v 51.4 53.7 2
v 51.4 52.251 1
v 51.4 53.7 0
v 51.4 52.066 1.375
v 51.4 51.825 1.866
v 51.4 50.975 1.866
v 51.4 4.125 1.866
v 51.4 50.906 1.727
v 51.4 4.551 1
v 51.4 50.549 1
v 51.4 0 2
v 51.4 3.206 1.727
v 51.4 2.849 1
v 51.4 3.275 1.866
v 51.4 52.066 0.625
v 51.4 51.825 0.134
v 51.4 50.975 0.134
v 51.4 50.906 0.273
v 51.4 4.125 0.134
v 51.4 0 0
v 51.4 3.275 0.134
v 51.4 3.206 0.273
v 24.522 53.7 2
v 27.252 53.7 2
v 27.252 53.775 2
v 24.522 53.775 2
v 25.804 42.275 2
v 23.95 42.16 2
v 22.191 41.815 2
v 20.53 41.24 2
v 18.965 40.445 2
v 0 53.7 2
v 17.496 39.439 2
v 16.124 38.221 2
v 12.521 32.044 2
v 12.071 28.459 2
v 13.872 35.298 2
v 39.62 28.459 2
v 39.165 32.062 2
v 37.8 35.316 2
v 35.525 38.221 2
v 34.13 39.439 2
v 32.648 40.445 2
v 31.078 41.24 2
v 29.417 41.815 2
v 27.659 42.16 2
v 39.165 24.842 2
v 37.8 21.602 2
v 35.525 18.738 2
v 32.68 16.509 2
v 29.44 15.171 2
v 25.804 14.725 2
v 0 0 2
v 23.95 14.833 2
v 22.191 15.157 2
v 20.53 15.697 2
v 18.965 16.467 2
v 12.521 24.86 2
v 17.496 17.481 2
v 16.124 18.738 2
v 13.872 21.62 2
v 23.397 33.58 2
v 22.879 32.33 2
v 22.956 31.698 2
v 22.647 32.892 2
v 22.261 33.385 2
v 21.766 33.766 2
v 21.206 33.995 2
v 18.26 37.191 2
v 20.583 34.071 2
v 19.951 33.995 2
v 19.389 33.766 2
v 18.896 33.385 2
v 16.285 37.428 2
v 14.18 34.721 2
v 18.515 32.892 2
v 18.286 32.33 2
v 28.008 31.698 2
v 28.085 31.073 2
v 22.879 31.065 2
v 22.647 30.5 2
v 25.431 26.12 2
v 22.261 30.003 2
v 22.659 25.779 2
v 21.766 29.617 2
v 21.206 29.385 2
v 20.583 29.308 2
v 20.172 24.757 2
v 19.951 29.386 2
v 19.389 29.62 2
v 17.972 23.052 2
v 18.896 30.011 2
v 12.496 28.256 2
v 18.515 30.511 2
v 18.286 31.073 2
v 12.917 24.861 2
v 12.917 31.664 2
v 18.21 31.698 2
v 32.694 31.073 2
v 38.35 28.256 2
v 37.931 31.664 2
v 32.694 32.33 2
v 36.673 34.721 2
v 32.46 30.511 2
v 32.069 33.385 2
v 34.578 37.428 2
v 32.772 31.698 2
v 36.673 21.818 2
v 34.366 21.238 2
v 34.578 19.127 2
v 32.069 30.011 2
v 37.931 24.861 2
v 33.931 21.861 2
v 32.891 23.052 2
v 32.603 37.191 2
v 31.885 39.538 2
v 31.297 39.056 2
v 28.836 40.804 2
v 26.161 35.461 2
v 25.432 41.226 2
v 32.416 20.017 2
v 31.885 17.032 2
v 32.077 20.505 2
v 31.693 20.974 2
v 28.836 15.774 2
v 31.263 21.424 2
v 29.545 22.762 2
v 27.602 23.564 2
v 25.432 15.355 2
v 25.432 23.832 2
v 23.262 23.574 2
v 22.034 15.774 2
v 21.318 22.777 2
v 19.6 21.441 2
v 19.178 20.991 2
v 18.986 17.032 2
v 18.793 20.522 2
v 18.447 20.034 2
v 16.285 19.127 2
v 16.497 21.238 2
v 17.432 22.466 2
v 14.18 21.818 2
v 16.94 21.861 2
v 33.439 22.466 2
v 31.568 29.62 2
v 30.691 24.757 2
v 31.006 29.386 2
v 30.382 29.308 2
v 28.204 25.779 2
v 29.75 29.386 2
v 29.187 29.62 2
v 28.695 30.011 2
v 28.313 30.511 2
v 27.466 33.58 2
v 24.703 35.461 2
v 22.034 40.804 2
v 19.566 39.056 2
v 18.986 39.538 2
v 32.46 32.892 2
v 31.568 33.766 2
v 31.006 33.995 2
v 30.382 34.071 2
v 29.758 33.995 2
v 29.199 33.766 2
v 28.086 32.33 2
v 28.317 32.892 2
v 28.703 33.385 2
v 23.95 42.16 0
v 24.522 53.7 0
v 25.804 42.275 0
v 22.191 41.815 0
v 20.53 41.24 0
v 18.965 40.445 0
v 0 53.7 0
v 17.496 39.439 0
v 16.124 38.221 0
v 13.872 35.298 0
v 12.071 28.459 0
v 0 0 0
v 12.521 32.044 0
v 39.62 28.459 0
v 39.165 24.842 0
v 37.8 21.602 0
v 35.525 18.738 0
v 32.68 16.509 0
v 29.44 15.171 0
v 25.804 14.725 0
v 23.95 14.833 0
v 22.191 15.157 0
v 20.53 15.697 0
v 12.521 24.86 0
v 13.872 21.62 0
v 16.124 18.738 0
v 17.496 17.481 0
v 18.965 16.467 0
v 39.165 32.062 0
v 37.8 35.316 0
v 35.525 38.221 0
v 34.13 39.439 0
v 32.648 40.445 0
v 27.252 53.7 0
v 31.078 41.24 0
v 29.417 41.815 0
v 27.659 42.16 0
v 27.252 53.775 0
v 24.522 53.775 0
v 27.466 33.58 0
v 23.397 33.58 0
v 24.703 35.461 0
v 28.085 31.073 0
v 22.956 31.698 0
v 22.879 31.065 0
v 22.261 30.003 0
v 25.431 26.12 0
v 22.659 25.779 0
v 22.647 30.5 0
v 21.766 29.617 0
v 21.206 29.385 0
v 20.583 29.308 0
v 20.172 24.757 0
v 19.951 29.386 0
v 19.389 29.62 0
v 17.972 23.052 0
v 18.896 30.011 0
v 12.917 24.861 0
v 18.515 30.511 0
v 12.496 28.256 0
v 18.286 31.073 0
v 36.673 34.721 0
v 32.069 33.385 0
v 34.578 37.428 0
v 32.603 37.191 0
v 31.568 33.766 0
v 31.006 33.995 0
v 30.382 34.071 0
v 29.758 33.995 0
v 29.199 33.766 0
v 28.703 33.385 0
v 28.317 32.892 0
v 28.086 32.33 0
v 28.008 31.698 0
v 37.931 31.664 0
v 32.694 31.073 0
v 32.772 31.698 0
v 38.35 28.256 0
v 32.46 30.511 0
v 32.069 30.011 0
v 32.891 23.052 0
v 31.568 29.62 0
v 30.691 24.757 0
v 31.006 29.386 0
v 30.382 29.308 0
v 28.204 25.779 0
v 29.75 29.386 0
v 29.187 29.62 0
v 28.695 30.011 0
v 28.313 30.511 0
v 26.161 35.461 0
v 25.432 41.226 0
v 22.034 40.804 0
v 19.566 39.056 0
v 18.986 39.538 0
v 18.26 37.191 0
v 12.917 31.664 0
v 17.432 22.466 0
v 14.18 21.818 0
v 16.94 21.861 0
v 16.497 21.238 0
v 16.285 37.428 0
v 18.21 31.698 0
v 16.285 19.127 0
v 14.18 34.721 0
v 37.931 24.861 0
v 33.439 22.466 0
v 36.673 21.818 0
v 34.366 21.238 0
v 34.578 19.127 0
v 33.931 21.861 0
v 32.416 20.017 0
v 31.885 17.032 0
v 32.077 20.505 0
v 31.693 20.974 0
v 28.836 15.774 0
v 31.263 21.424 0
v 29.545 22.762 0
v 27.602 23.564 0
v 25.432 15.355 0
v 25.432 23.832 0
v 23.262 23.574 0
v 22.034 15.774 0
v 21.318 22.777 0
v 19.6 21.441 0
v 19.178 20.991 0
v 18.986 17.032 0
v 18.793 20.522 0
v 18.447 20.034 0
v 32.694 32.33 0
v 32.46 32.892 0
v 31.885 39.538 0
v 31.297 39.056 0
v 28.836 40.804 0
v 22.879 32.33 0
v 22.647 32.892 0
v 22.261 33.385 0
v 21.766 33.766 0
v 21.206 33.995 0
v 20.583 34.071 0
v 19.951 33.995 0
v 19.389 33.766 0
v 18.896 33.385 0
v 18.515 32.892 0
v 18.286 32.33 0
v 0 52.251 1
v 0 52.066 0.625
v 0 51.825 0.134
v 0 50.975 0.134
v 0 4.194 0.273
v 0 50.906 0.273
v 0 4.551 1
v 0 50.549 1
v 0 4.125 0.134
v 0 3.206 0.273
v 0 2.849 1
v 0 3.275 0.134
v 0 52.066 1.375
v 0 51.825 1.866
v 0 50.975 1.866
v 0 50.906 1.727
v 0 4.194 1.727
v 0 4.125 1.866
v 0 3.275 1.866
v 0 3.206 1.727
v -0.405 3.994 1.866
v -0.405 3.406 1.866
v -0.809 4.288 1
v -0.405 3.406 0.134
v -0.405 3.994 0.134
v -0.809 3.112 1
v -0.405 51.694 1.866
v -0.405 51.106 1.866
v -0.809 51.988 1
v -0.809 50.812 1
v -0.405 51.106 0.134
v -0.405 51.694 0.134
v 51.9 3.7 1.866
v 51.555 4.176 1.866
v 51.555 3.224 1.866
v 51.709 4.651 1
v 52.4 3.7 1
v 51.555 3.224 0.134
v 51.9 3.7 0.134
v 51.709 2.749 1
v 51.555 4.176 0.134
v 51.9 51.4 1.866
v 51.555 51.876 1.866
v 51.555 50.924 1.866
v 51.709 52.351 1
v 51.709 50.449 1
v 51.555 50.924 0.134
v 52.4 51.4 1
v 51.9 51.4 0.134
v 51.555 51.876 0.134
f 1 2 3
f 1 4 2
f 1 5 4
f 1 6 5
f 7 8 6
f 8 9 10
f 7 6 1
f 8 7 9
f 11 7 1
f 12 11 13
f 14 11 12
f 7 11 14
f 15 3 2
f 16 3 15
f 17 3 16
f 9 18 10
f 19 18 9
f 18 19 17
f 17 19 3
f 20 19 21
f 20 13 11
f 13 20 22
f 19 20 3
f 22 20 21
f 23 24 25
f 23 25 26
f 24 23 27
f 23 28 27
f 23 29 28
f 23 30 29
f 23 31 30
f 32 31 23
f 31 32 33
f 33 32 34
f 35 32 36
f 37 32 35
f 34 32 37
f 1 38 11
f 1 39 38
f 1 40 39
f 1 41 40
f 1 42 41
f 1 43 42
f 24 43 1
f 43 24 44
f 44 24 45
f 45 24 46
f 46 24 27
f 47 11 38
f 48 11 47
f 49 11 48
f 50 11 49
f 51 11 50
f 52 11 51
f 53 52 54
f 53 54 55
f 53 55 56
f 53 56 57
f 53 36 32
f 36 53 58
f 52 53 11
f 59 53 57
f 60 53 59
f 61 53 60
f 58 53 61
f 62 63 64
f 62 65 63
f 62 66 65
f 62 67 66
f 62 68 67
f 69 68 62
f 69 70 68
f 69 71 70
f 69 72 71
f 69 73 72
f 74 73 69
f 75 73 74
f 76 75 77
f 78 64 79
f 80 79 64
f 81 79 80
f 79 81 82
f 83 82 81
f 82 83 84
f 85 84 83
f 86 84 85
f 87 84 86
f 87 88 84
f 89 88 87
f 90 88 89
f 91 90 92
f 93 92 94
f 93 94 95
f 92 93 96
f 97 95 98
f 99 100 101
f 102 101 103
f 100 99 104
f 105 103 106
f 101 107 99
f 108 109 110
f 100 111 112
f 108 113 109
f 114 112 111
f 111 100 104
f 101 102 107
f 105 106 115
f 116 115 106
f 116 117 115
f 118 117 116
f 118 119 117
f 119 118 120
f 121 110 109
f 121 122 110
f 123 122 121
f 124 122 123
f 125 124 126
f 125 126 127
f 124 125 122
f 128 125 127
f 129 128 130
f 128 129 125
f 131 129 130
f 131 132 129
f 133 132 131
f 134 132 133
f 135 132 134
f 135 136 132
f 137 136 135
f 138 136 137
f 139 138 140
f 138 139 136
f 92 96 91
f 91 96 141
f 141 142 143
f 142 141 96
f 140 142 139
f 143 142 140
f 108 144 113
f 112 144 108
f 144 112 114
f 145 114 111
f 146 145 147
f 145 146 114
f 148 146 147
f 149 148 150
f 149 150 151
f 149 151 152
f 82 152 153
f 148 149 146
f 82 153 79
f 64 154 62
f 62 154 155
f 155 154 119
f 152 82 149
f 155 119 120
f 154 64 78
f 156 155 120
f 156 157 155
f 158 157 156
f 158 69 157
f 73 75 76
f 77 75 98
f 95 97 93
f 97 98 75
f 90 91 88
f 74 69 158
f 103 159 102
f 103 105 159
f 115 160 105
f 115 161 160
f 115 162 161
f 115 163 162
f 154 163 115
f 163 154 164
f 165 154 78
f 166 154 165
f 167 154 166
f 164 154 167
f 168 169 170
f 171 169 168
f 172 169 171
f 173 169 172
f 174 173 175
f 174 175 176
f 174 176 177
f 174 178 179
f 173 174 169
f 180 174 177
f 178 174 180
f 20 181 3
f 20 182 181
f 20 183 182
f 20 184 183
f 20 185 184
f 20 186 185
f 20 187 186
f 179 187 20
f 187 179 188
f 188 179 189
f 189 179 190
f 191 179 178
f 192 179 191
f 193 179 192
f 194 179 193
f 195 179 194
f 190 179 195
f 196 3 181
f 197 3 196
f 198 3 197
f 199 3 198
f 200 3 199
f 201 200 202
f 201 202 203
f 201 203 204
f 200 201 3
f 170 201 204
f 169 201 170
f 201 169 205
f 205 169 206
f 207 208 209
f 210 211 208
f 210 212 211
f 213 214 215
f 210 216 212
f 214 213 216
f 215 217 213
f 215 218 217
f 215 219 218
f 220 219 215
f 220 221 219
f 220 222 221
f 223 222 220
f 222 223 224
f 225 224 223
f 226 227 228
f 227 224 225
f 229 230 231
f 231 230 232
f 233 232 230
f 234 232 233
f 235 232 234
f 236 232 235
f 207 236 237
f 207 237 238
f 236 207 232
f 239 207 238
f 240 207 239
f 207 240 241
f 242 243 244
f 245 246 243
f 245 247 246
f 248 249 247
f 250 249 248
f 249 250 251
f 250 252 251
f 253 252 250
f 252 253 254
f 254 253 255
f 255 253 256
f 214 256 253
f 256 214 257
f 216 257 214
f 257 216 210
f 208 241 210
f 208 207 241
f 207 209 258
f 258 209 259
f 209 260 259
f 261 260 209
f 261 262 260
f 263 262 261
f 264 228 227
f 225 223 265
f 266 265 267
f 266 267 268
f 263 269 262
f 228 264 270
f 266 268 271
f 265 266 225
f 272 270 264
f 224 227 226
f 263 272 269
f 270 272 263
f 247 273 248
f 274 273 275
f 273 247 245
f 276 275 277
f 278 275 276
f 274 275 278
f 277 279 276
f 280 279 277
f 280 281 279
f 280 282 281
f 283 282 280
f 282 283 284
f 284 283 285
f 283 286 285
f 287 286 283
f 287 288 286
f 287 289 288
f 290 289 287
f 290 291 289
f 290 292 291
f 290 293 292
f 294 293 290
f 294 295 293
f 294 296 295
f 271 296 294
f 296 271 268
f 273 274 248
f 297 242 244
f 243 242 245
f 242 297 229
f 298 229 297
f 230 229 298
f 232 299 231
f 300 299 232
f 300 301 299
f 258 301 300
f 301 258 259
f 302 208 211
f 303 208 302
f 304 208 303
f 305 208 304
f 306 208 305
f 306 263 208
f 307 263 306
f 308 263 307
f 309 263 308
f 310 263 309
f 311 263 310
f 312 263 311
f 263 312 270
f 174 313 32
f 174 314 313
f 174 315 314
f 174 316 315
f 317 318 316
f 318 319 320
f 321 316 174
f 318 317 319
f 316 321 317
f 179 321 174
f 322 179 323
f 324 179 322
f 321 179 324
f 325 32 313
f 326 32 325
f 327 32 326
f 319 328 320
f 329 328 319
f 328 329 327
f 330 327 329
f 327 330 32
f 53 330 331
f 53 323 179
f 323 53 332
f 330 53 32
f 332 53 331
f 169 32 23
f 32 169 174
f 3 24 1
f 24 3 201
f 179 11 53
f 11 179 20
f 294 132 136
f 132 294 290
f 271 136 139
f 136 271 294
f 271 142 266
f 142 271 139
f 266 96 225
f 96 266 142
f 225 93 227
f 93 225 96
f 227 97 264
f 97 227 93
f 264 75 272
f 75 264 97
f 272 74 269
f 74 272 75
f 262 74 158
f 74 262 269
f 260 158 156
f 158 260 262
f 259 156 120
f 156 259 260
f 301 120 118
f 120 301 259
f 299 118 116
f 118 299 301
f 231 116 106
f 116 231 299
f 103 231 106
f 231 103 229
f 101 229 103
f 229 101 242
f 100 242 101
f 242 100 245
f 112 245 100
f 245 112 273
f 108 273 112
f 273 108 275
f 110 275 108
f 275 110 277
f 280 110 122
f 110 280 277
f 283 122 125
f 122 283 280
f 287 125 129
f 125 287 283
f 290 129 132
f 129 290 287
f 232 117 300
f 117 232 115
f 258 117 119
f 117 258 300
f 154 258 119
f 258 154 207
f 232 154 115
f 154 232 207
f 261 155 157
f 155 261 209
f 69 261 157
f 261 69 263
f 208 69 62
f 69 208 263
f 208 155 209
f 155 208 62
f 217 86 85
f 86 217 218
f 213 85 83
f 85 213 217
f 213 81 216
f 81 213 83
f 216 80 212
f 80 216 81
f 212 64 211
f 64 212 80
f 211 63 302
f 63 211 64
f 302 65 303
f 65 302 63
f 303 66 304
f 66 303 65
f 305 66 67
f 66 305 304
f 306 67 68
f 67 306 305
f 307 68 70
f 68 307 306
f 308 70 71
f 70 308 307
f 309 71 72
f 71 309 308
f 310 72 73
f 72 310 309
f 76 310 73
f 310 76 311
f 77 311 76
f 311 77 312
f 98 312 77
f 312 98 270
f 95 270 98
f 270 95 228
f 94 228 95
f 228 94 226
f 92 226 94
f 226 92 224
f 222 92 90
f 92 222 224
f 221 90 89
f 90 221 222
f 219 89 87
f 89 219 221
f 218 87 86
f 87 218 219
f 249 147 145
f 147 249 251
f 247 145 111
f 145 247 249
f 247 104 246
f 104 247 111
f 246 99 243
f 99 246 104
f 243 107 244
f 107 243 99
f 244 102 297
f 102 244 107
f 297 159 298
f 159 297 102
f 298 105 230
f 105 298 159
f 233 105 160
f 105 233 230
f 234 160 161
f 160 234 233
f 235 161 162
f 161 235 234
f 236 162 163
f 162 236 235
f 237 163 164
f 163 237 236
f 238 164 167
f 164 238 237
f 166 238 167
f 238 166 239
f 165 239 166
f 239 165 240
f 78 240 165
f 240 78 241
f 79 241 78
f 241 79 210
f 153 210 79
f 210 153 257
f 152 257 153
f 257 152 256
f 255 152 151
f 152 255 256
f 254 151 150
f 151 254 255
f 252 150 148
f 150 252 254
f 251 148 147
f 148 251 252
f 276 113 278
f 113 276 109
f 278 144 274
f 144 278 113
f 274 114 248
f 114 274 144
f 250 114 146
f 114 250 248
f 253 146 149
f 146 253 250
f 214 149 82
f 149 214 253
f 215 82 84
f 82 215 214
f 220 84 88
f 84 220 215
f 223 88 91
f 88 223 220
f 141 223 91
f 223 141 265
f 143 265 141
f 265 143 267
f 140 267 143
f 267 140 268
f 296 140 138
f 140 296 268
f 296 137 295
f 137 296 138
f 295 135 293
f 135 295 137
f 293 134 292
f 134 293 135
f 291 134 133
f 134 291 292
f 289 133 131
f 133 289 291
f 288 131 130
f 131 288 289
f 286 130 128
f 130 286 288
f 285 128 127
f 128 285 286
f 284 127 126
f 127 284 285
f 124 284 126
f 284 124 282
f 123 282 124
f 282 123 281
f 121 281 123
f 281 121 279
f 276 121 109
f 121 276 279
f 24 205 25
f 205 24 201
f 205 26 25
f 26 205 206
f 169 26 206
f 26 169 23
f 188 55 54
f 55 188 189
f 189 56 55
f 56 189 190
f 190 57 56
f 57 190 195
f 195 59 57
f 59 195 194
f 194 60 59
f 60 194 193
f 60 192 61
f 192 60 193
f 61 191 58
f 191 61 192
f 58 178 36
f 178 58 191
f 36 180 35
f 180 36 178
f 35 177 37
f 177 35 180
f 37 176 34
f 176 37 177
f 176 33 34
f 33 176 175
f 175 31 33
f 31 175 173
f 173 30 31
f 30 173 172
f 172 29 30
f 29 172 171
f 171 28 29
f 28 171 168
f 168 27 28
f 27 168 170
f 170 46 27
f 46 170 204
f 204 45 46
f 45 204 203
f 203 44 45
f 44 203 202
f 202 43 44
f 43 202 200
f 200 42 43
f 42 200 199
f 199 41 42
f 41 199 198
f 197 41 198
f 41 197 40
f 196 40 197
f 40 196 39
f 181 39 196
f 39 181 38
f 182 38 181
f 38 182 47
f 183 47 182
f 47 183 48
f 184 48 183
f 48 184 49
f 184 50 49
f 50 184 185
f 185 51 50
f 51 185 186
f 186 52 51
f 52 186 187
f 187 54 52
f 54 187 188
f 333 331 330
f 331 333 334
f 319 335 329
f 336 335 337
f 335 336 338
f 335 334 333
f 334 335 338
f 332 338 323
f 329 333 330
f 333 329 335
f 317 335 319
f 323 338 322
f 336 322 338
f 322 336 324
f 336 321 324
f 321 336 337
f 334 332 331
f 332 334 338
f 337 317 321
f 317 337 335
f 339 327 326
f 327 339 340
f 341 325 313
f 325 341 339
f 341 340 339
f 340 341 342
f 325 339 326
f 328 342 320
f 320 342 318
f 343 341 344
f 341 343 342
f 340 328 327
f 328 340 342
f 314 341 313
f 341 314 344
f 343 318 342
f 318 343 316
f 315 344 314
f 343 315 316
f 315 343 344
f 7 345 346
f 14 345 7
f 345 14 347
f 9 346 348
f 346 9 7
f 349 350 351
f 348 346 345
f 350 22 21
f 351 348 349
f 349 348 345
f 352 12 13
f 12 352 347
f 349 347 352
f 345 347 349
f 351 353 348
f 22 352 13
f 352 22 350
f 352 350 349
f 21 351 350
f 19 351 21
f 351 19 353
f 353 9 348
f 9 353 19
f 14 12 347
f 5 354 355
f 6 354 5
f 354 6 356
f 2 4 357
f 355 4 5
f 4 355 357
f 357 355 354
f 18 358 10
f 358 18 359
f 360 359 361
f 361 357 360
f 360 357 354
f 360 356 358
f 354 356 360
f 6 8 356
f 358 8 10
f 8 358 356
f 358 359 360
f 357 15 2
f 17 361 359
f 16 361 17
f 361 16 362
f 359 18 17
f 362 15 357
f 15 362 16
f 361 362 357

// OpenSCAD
echo(version=version());

font1 = "Liberation Sans";
font2 = "Segoe UI Emoji";

module letter(font, letter_size, letter_height, l) {
  linear_extrude(height = letter_height) {
    text(l, size = letter_size, font = font, halign = "center", valign = "center", $fn = 16);
  }
}

cube_size = 56;
cube_h = 26;
cube_bord=2;
/*difference() {
  translate([- cube_size/2, -cube_size/2, 0]) cube([cube_size, cube_size, cube_h]);
  translate([0, - cube_size/2 + 1, 13]) rotate([90, 0, 0]) letter(8,2,"Genesys");
  translate([- cube_size/2 + cube_bord,- cube_size/2 +cube_bord,cube_bord]) cube([cube_size - cube_bord*2, cube_size - cube_bord*2, cube_h - cube_bord*2]);
  translate([-cube_size/2 + cube_bord,-cube_size/2 + cube_bord,cube_h - cube_bord - 0.1]) cube([cube_size - cube_bord*2, cube_size, 10]);
  
  translate([-cube_size/2+cube_bord, cube_size/2-cube_bord, cube_h-cube_bord/2]) sphere(r = 1);
  translate([-cube_size/2+cube_bord, -cube_size/2+cube_bord*3, cube_h-cube_bord/2]) sphere(r = 1);
  translate([cube_size/2-cube_bord, cube_size/2-cube_bord, cube_h-cube_bord/2]) sphere(r = 1);
  translate([cube_size/2-cube_bord, -cube_size/2+cube_bord*3, cube_h-cube_bord/2]) sphere(r = 1);
}

translate([cube_size/2 - cube_bord, 0, 5]) sphere(r = 1.6);
translate([-cube_size/2 + cube_bord, 0, 5]) sphere(r = 1.6);

translate([-cube_size/2 + cube_bord,-cube_size/2 + cube_bord,0]) cube([4, 4, 4]);
translate([cube_size/2 - cube_bord*3,-cube_size/2 + cube_bord,0])  cube([4, 4, 4]);
translate([-cube_size/2 + cube_bord,cube_size/2 - cube_bord*3,0])  cube([4, 4, 4]);
translate([cube_size/2 - cube_bord*3,cube_size/2 - cube_bord*3,0])   cube([4, 4, 4]);
*/
// top
// translate([- cube_size/2 + cube_bord + 0.3, -cube_size/2 + cube_bord +0.3, cube_h-cube_bord])


union() {
difference() {
    cube([cube_size - cube_bord*2-0.6, cube_size - cube_bord-0.3, 2]);
    translate([cube_size/2-cube_bord*1.5, cube_size/2, -2]) letter(font2, 25,5,"😠");    
}        
translate([cube_size/2-cube_bord*1.5, cube_size/2, 0]) letter(font1, 61, 2,"\u263C");
translate([0, cube_bord*2 - 0.3, 1]) sphere(r = 1);
translate([0, cube_size-cube_bord*2-0.6, 1]) sphere(r = 1);
translate([cube_size-cube_bord*2-0.6, cube_bord*2 - 0.3, 1]) sphere(r = 1);
translate([cube_size-cube_bord*2-0.6, cube_size-cube_bord*2-0.6, 1]) sphere(r = 1);
}
